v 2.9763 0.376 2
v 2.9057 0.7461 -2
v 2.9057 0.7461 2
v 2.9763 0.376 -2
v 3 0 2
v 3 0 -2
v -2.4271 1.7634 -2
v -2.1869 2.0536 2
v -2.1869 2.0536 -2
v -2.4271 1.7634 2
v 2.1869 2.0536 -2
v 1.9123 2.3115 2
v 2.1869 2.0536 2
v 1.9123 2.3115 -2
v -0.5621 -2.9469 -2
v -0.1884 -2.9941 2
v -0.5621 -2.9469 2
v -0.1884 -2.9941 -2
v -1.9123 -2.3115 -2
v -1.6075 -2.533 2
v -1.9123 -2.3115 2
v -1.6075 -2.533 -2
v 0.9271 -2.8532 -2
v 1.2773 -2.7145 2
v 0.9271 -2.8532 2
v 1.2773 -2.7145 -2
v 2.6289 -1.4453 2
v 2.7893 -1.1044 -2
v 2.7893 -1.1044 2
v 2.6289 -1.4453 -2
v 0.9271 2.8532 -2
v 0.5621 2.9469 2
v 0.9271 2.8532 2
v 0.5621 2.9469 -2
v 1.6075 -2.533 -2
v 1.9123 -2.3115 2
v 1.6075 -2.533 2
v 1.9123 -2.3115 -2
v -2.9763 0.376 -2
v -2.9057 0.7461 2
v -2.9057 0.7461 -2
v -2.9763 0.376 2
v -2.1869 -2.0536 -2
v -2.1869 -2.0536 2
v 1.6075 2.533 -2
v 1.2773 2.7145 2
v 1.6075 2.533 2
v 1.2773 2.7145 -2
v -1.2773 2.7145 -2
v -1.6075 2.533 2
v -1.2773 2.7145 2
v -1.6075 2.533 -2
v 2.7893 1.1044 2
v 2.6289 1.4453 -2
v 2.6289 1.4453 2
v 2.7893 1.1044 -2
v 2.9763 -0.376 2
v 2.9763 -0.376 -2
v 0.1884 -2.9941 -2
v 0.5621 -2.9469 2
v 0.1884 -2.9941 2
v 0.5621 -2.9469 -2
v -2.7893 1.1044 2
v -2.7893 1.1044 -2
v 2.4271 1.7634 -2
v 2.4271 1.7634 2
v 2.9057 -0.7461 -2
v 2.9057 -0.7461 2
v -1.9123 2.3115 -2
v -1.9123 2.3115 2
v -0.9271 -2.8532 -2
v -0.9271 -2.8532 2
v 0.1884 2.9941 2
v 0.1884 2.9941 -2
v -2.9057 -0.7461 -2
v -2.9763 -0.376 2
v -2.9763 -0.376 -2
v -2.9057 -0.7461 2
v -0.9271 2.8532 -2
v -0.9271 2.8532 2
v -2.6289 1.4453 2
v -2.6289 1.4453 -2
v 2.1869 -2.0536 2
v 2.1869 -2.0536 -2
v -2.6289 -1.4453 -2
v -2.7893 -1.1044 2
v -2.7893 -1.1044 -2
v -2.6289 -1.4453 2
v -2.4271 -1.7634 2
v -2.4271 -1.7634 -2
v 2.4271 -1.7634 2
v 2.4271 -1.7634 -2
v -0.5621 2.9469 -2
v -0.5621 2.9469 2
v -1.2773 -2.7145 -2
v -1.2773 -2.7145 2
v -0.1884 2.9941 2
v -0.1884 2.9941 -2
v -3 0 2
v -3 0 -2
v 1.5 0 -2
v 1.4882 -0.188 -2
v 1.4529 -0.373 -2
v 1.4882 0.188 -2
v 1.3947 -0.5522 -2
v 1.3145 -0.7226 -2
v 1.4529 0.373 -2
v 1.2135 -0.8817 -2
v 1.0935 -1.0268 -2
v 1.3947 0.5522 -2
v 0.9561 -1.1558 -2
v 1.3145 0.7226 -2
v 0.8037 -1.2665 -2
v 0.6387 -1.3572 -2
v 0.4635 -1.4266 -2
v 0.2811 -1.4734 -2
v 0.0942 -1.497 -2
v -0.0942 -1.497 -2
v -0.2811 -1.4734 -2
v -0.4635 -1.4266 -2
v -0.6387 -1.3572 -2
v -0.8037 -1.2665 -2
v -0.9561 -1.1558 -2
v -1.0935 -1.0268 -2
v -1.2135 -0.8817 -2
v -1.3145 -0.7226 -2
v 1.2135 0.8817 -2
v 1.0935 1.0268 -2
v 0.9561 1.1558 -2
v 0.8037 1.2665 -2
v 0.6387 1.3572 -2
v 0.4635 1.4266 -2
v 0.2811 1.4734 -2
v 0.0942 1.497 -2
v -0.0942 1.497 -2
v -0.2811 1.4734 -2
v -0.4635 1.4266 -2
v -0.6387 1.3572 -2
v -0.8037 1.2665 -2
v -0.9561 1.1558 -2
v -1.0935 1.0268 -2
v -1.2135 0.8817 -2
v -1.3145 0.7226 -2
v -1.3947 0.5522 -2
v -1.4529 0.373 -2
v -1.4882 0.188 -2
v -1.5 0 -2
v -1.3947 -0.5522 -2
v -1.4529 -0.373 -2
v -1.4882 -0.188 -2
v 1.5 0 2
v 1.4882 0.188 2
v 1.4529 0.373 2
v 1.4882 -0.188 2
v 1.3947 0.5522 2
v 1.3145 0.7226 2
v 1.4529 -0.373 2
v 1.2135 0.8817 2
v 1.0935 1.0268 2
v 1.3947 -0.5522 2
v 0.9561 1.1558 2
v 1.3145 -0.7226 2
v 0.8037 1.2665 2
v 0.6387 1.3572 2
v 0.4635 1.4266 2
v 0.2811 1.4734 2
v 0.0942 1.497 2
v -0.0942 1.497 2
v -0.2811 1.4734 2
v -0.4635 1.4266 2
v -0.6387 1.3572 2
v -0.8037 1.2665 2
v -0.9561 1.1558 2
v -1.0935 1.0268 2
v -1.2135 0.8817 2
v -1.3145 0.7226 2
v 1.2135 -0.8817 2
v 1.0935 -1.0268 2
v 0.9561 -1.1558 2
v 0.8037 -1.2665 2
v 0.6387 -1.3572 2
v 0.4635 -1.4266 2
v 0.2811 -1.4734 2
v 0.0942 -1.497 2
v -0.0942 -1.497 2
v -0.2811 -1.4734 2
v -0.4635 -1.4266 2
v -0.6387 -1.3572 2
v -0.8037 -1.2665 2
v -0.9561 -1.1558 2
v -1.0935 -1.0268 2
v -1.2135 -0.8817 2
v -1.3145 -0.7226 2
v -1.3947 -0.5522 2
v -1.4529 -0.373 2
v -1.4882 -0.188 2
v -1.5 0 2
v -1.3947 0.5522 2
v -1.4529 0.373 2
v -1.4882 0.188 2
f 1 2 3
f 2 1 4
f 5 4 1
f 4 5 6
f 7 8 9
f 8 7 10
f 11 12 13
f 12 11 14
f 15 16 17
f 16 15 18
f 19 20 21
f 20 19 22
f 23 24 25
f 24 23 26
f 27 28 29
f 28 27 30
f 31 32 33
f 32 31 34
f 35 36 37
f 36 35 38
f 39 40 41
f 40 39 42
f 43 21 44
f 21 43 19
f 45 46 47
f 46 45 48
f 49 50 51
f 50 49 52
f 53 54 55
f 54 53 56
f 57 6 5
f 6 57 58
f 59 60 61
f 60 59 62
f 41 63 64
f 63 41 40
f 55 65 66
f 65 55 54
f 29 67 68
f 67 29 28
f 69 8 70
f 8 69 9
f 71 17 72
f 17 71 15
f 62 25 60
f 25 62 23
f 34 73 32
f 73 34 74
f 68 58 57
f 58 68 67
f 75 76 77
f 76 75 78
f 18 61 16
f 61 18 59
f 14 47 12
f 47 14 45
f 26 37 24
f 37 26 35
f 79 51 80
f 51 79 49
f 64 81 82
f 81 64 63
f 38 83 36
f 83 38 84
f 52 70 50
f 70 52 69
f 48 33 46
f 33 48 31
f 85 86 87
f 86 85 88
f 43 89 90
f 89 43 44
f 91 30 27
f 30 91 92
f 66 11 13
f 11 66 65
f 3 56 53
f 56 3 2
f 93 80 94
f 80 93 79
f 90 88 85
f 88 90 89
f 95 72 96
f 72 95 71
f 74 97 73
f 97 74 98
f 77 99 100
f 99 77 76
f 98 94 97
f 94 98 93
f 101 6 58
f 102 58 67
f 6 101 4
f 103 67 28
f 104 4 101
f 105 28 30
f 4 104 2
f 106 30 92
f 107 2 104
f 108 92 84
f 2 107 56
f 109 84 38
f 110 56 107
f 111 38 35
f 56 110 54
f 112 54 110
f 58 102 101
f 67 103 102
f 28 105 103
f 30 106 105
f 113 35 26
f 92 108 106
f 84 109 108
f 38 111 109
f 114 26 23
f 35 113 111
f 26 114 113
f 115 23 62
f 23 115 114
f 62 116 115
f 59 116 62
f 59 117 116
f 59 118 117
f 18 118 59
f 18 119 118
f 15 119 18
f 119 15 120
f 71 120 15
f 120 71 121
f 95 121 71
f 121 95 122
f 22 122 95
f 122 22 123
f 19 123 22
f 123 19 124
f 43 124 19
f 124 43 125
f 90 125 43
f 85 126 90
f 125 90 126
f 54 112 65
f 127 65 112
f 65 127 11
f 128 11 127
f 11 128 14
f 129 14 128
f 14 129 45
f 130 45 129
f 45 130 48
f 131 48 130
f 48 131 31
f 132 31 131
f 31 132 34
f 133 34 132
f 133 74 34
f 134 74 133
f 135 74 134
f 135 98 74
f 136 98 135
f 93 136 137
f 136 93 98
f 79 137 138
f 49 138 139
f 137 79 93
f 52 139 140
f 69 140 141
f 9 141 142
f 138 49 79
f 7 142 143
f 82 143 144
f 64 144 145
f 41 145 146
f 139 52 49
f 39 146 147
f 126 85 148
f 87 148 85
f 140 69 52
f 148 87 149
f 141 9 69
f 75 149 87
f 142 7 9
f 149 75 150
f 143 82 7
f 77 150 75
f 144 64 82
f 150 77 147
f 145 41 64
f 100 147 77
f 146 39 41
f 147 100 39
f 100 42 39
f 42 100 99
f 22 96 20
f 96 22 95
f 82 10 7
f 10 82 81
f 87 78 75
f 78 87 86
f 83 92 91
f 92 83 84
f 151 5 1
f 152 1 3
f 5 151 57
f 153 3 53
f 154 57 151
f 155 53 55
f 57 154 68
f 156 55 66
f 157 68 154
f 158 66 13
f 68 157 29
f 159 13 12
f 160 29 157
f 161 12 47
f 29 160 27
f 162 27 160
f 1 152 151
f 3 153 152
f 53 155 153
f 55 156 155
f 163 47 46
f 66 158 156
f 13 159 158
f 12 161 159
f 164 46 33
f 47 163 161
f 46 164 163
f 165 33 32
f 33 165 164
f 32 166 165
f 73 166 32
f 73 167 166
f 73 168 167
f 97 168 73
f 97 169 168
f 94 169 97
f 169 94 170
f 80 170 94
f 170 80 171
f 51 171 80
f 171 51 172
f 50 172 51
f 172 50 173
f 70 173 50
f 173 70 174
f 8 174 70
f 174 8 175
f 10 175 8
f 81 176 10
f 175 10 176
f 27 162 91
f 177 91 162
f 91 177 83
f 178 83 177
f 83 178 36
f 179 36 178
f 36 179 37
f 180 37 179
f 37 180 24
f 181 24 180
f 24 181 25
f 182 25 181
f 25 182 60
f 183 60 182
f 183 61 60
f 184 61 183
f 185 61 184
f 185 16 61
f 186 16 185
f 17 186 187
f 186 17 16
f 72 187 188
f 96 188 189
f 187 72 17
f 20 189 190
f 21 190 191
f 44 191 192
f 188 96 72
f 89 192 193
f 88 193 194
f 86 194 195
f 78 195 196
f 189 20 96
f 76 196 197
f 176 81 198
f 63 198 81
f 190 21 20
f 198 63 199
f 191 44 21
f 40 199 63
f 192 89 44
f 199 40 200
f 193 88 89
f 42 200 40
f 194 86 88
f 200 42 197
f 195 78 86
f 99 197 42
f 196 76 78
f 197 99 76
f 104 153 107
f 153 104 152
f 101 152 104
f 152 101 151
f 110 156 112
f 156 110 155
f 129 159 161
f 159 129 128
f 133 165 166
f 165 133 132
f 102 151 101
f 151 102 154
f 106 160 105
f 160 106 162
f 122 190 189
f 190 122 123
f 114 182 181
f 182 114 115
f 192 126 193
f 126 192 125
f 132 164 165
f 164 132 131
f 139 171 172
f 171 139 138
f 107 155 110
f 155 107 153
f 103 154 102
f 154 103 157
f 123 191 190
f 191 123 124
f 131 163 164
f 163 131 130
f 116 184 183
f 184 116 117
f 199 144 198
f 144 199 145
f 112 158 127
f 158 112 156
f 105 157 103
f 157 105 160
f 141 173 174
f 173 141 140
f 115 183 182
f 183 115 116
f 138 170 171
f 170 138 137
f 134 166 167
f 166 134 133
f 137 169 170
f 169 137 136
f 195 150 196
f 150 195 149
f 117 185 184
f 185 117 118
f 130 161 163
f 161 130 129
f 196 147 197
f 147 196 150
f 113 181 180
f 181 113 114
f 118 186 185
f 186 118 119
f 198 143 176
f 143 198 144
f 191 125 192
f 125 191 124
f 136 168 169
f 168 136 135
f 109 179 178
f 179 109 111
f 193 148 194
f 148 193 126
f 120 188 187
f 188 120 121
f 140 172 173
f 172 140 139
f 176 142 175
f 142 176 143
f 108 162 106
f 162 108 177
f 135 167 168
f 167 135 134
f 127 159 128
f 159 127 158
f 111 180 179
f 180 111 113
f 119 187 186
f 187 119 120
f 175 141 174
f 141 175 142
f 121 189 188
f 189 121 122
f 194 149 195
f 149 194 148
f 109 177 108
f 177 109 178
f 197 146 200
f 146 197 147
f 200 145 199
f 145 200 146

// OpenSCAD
$fn = 50;


difference() {
	union() {
		translate(v = [0, 0, -2.0000000000]) {
			cylinder(h = 4, r = 3.0000000000);
		}
	}
	union() {
		translate(v = [0, 0, -100.0000000000]) {
			cylinder(h = 200, r = 1.5000000000);
		}
	}
}
